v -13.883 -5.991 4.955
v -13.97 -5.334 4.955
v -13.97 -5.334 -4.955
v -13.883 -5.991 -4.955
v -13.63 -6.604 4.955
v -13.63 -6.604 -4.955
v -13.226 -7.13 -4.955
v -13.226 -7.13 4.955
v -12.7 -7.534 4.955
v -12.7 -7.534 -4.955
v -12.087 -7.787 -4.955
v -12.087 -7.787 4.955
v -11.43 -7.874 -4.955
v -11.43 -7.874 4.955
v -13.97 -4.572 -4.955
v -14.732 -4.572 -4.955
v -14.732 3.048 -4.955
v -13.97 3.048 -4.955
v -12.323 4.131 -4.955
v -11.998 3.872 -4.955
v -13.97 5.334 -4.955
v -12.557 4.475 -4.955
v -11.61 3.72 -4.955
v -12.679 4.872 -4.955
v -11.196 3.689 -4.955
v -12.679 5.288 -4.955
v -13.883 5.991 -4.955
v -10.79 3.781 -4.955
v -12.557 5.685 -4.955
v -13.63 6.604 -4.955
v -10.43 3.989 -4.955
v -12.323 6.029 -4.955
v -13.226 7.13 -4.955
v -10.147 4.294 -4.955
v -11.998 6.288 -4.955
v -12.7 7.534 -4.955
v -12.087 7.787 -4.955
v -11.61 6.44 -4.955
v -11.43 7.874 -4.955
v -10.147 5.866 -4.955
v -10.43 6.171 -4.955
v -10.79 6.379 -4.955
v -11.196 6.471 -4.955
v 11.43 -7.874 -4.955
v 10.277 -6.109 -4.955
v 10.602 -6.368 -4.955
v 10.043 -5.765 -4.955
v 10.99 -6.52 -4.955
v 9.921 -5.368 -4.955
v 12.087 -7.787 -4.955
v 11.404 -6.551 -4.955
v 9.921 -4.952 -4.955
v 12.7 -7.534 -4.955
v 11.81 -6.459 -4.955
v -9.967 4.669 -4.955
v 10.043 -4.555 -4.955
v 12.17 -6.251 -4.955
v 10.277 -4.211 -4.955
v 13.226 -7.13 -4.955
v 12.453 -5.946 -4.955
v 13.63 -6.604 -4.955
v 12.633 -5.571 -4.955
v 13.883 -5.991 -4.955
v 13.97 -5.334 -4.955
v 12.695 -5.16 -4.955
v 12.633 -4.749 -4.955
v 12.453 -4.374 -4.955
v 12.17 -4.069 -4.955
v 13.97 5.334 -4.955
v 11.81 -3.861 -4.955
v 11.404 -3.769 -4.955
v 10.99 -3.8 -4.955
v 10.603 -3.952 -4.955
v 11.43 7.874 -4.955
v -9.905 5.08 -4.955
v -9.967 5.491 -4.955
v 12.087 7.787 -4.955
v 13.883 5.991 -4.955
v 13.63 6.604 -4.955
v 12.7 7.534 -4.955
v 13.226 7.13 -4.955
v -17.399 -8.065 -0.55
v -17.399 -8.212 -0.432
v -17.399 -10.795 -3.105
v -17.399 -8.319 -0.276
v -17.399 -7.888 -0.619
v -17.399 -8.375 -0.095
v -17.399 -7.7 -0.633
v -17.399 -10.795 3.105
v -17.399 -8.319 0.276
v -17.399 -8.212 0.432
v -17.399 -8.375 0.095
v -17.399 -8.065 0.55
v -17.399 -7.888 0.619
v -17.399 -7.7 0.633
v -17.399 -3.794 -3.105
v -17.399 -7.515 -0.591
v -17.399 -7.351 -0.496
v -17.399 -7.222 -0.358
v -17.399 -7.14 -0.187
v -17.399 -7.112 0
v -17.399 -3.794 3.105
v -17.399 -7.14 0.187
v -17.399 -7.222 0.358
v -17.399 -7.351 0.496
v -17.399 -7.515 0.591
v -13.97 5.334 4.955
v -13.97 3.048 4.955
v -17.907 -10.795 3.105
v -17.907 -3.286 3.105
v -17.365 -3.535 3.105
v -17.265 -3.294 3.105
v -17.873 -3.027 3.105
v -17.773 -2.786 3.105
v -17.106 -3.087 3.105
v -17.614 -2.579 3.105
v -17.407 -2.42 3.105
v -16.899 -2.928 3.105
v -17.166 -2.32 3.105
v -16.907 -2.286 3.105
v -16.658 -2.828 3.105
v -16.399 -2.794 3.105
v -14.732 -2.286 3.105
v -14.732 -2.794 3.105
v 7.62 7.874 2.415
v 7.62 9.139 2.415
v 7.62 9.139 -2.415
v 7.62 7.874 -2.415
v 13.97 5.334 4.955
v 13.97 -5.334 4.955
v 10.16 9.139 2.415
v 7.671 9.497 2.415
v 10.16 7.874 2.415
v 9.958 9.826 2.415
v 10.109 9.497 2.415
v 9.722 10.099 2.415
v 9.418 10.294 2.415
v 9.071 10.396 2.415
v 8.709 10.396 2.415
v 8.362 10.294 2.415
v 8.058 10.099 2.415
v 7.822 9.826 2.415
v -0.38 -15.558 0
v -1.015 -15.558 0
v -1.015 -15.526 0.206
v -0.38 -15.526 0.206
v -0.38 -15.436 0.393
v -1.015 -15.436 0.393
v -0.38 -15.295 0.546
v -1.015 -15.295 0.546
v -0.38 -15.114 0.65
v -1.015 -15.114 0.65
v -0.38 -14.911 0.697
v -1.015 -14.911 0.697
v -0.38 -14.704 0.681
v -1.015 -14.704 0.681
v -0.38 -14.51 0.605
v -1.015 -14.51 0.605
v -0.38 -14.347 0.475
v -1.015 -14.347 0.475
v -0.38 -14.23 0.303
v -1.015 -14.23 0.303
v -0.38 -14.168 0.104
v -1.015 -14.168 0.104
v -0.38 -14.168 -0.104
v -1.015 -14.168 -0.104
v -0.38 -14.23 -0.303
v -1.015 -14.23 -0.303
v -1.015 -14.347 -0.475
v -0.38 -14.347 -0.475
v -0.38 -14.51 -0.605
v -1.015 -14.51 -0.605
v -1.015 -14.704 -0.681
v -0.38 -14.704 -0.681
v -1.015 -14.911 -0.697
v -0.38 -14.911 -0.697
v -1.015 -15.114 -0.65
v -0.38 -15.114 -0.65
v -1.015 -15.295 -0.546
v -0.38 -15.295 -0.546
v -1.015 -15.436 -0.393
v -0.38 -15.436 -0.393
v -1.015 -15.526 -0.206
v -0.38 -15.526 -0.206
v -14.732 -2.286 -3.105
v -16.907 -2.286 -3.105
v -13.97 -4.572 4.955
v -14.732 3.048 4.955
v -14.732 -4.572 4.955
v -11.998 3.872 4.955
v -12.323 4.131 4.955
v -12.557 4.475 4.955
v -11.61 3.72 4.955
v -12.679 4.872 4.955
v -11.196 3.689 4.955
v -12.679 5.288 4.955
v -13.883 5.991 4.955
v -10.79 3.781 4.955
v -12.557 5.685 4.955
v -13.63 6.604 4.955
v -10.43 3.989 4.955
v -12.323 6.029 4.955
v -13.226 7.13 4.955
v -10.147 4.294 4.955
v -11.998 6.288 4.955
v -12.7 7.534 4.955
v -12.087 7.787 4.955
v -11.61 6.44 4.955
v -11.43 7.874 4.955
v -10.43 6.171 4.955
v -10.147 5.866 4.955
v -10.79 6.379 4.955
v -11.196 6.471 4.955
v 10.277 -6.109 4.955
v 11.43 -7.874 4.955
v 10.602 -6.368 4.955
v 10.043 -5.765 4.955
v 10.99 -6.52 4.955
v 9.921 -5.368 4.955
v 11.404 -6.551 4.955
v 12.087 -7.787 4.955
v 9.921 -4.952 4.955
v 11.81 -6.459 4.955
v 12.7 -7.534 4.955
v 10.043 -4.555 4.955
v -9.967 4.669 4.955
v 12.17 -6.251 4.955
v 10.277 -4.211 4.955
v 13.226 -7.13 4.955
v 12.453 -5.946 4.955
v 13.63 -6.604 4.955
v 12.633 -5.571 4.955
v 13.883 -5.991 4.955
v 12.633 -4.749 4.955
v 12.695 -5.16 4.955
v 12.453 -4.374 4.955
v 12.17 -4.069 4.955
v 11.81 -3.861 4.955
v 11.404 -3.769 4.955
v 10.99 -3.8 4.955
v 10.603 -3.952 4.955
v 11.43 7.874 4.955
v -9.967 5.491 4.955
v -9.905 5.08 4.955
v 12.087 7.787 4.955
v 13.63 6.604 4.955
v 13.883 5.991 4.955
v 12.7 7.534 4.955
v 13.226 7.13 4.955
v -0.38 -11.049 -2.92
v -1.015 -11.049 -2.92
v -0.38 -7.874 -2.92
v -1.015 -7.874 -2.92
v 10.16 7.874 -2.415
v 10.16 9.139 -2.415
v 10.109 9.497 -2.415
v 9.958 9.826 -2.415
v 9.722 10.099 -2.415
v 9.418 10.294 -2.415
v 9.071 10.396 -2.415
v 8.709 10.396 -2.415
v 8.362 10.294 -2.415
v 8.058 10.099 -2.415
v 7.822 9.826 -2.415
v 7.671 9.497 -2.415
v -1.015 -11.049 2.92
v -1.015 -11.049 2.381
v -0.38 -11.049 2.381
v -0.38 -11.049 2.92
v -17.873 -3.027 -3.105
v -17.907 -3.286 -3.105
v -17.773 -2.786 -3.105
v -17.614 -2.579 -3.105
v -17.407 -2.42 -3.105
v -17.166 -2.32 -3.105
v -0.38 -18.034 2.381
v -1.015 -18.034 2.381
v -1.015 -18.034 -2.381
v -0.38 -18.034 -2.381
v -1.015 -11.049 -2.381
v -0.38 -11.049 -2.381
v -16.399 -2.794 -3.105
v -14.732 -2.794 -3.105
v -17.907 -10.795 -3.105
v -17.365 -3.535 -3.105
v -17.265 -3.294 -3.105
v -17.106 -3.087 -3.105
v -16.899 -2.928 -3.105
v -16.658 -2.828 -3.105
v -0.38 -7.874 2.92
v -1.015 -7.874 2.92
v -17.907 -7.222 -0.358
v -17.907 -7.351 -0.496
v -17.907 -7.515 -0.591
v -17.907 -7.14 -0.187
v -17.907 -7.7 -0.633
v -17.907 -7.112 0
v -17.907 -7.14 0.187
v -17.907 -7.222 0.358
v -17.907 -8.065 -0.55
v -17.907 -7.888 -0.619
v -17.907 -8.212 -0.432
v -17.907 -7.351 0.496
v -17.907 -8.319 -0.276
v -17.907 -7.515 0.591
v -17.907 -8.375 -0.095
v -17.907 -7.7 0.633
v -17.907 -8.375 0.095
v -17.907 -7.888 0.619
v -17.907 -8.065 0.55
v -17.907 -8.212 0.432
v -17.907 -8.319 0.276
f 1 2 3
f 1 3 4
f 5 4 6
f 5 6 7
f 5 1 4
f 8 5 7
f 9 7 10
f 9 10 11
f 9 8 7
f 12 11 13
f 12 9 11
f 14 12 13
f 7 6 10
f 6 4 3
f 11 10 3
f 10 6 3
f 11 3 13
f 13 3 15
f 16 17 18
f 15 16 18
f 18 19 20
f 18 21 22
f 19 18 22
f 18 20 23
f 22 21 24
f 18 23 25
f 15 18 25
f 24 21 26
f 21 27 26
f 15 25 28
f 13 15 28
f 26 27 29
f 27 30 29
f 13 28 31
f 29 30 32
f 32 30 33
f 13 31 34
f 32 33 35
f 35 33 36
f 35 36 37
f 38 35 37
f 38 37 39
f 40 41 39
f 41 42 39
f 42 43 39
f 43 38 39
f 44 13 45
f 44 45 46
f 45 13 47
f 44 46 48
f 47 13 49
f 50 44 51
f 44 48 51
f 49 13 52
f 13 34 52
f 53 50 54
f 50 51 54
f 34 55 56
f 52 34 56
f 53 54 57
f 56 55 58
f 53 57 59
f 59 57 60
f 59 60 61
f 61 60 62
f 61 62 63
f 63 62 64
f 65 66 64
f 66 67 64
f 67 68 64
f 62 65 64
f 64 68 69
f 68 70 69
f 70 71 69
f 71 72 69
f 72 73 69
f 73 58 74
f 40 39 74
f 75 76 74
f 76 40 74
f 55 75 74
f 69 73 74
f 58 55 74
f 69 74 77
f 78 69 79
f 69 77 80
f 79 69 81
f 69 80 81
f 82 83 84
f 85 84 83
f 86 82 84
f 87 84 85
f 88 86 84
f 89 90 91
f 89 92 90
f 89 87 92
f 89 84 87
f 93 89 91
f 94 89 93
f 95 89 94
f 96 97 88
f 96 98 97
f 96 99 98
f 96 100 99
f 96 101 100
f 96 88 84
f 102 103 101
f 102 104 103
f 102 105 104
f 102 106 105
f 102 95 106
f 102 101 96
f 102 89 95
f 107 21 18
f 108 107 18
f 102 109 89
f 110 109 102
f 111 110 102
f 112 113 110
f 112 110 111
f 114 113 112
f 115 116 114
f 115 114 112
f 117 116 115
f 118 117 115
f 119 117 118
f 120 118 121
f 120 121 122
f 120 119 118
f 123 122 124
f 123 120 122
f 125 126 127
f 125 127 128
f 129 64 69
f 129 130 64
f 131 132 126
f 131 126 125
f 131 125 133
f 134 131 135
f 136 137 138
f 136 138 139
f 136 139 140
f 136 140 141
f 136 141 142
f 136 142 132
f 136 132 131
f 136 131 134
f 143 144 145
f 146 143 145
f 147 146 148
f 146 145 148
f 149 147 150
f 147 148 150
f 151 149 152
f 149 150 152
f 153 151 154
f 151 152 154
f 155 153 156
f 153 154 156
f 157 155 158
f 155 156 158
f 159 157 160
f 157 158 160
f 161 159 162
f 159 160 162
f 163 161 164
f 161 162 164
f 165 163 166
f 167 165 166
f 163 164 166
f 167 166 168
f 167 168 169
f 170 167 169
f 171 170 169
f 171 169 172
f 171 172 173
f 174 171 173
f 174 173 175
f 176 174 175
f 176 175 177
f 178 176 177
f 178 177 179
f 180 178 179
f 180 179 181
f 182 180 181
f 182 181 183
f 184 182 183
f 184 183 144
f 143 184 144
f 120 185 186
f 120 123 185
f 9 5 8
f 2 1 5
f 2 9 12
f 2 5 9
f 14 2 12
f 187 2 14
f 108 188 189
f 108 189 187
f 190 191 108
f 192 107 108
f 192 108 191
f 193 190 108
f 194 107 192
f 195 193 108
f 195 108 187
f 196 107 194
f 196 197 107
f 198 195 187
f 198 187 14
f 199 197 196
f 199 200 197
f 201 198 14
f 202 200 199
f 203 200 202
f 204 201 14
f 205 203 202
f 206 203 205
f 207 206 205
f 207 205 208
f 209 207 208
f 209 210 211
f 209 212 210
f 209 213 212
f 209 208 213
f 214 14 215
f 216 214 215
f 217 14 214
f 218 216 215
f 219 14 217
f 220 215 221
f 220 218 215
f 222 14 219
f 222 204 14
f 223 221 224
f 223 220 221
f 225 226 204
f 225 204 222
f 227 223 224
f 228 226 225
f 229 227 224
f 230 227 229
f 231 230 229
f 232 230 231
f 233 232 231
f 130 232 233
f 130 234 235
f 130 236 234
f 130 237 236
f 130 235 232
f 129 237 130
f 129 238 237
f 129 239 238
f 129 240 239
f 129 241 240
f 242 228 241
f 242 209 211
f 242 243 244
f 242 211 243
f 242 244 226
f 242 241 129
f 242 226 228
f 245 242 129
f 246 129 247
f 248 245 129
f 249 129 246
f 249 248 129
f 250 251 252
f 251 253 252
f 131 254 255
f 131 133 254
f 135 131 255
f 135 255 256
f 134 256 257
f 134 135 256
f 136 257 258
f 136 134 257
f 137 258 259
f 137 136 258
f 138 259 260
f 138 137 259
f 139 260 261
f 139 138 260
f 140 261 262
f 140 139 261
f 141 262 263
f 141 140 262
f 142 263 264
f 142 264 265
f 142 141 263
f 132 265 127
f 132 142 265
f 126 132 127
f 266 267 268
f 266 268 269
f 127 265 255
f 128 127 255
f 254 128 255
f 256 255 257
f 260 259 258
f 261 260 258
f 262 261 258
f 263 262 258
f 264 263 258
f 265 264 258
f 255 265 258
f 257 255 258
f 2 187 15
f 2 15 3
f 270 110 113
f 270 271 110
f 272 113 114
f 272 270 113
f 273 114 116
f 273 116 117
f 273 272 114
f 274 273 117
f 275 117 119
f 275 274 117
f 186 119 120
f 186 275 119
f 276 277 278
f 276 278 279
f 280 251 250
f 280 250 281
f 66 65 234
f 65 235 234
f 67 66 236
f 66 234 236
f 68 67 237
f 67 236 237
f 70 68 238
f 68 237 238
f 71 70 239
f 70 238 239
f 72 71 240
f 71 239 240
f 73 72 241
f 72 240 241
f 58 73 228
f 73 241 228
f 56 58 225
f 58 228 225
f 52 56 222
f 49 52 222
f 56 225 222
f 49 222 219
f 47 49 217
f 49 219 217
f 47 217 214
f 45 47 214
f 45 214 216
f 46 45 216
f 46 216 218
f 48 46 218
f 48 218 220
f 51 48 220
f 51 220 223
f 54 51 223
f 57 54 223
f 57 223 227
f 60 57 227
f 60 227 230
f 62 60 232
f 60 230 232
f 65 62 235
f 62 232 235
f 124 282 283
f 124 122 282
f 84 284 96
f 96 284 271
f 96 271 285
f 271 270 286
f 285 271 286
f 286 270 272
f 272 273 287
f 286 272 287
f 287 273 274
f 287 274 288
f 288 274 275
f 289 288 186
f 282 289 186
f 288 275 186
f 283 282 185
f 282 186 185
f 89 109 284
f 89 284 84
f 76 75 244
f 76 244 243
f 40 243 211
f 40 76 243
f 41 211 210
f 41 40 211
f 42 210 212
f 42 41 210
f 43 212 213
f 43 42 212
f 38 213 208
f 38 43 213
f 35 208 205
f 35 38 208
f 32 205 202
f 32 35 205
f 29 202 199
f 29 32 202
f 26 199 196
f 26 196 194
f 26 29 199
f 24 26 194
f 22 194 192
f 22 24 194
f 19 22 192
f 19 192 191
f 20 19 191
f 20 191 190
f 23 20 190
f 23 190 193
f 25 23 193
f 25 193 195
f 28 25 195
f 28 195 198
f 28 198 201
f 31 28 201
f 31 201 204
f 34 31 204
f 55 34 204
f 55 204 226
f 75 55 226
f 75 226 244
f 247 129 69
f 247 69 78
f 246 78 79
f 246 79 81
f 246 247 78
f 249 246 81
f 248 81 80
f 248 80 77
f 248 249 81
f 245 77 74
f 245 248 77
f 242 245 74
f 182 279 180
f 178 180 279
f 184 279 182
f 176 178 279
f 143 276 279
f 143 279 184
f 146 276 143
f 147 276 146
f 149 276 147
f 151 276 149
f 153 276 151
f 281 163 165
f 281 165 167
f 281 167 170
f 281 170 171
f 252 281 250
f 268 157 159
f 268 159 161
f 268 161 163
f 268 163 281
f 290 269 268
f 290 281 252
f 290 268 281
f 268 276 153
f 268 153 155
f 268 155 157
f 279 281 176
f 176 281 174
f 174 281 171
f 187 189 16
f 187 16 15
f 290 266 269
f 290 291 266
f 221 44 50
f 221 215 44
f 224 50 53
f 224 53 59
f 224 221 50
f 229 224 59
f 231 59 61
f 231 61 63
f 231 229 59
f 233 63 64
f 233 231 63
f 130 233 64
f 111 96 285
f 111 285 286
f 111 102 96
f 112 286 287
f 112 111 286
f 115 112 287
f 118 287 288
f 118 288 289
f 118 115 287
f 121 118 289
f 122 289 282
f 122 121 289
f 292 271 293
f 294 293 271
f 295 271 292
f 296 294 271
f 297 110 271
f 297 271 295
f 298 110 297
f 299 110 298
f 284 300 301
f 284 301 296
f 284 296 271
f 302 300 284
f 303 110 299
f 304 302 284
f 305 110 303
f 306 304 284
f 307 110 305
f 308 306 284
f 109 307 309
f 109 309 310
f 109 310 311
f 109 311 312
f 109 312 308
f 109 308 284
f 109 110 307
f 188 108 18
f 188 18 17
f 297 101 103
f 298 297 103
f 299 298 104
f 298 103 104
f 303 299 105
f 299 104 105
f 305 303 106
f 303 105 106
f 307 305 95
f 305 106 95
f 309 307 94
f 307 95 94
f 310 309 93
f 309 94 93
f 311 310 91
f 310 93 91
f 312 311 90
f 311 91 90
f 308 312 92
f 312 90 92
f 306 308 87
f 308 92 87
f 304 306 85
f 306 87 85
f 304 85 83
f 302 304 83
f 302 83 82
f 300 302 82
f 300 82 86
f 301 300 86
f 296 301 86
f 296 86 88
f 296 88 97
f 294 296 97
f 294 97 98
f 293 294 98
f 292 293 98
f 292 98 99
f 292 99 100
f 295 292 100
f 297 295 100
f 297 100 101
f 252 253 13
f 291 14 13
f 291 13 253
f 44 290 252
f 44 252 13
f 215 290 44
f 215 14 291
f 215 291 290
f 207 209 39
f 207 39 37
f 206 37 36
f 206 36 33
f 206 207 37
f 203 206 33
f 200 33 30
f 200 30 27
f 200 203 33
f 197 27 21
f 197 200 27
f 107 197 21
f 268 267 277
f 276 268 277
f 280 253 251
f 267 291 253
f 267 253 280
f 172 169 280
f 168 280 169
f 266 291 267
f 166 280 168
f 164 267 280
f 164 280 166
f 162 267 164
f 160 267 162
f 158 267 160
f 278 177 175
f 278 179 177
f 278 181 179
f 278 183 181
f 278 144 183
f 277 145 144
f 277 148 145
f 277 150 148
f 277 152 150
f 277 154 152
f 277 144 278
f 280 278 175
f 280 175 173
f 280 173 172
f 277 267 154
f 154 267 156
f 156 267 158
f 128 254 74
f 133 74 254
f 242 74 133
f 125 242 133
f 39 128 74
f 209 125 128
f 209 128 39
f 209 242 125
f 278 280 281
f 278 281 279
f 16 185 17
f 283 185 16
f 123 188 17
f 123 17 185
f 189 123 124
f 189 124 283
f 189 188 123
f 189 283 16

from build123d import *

# Parameters (mm, degrees)
SKETCH1_R      = 1.395
EXTRUDE1_DEPTH = 4.955
EXTRUDE2_DEPTH = 3.105
EXTRUDE3_DEPTH = 2.415
EXTRUDE4_DEPTH = 2.92
EXTRUDE5_REACH = 16.985
SKETCH5_W      = 6.985
SKETCH5_H      = 0.53875
SKETCH5_R      = 0.6985
SKETCH6_R      = 0.635
EXTRUDE7_DEPTH = 1.508
SKETCH_R       = 1.395
EXTRUDE8_DEPTH = 7.92
FILLET1_R      = 1


with BuildPart() as part:
    # Sketch1 → Extrude1 (new body, symmetric)
    with BuildSketch(Plane.XY):
        with Locations((-11.3, 5.08)):
            Circle(SKETCH1_R)
        with BuildLine():
            Line((13.97, -5.334), (13.97, 5.334))
            ThreePointArc((13.97, 5.334), (13.226051224, 7.130051224), (11.43, 7.874))
            Line((11.43, 7.874), (-11.43, 7.874))
            ThreePointArc((-11.43, 7.874), (-13.226051224, 7.130051224), (-13.97, 5.334))
            Line((-13.97, 5.334), (-13.97, 3.048))
            Line((-13.97, 3.048), (-14.732, 3.048))
            Line((-14.732, 3.048), (-14.732, -4.572))
            Line((-14.732, -4.572), (-13.97, -4.572))
            Line((-13.97, -4.572), (-13.97, -5.334))
            ThreePointArc((-13.97, -5.334), (-13.226051224, -7.130051224), (-11.43, -7.874))
            Line((-11.43, -7.874), (11.43, -7.874))
            ThreePointArc((11.43, -7.874), (13.226051224, -7.130051224), (13.97, -5.334))
        make_face()
        with Locations((11.3, -5.16)):
            Circle(SKETCH1_R, mode=Mode.SUBTRACT)
        with Locations((-11.3, 5.08)):
            Circle(SKETCH1_R, mode=Mode.SUBTRACT)
        with Locations((11.3, -5.16)):
            Circle(SKETCH1_R)
    extrude(amount=EXTRUDE1_DEPTH, both=True)

    # Sketch2 → Extrude2 (add, symmetric)
    with BuildSketch(Plane.XY):
        Polygon((-17.907, -2.286), (-17.907, -10.795), (-17.399, -10.795), (-17.399, -2.794), (-14.732, -2.794), (-14.732, -2.286), align=None)
    extrude(amount=EXTRUDE2_DEPTH, both=True)

    # Sketch3 → Extrude3 (add, symmetric)
    with BuildSketch(Plane.XY):
        with BuildLine():
            Line((10.16, 7.874), (10.16, 9.139))
            ThreePointArc((10.16, 9.139), (8.89, 10.409), (7.62, 9.139))
            Line((7.62, 9.139), (7.62, 7.874))
            Line((7.62, 7.874), (10.16, 7.874))
        make_face()
    extrude(amount=EXTRUDE3_DEPTH, both=True)

    # Sketch4 → Extrude4 (add, symmetric)
    with BuildSketch(Plane.XY):
        Polygon((-0.38, -18.034), (-0.38, -10.984), (-1.015, -11.05270614), (-1.015, -18.034), align=None)
        Polygon((-1.015, -11.05270614), (-0.38, -10.984), (-0.38, -7.874), (-1.015, -7.874), (-1.015, -10.414), align=None)
    extrude(amount=EXTRUDE4_DEPTH, both=True)

    # Sketch5 → Extrude5 (cut, up to next)
    with BuildSketch(Plane(origin=(-1.015, -13.250765139, 0), x_dir=(0, -1, 0), z_dir=(-1, 0, 0)), mode=Mode.PRIVATE) as extrude5_sk1:
        with Locations((1.290734861, -2.650625)):
            Rectangle(SKETCH5_W, SKETCH5_H)
    extrude5_tool1 = extrude(extrude5_sk1.sketch, amount=-EXTRUDE5_REACH, mode=Mode.PRIVATE) & part.part
    add(extrude5_tool1.solids().sort_by_distance((-1.015, -14.5415, -2.650625))[0], mode=Mode.SUBTRACT)
    # Sketch5 → Extrude5 (cut, up to next)
    with BuildSketch(Plane(origin=(-1.015, -13.250765139, 0), x_dir=(0, -1, 0), z_dir=(-1, 0, 0)), mode=Mode.PRIVATE) as extrude5_sk2:
        with Locations((1.290734861, 2.650625)):
            Rectangle(SKETCH5_W, SKETCH5_H)
    extrude5_tool2 = extrude(extrude5_sk2.sketch, amount=-EXTRUDE5_REACH, mode=Mode.PRIVATE) & part.part
    add(extrude5_tool2.solids().sort_by_distance((-1.015, -14.5415, 2.650625))[0], mode=Mode.SUBTRACT)
    # Sketch5 → Extrude5 (cut, up to next)
    with BuildSketch(Plane(origin=(-1.015, -13.250765139, 0), x_dir=(0, -1, 0), z_dir=(-1, 0, 0)), mode=Mode.PRIVATE) as extrude5_sk3:
        with Locations((1.608234861, 0)):
            Circle(SKETCH5_R)
    extrude5_tool3 = extrude(extrude5_sk3.sketch, amount=-EXTRUDE5_REACH, mode=Mode.PRIVATE) & part.part
    add(extrude5_tool3.solids().sort_by_distance((-1.015, -14.859, 0))[0], mode=Mode.SUBTRACT)

    # Sketch6 → Extrude7 (cut, through all)
    with BuildSketch(Plane(origin=(-17.399, 14.605, 0), x_dir=(0, 1, 0), z_dir=(1, 0, 0))):
        with Locations((-22.352, 0)):
            Circle(SKETCH6_R)
    extrude(amount=-EXTRUDE7_DEPTH, mode=Mode.SUBTRACT)

    # Sketch → Extrude8 (cut, symmetric)
    with BuildSketch(Plane.XY):
        with Locations((-11.3, 5.08)):
            Circle(SKETCH_R)
        with Locations((11.3, -5.16)):
            Circle(SKETCH_R)
    extrude(amount=EXTRUDE8_DEPTH, both=True, mode=Mode.SUBTRACT)

    # Fillet1
    fillet1_edges = [part.edges().sort_by_distance(p)[0] for p in [
        (-17.907, -2.286, 0),
        (-17.399, -2.794, 0),
    ]]
    fillet(fillet1_edges, radius=FILLET1_R)


solid = part.part
